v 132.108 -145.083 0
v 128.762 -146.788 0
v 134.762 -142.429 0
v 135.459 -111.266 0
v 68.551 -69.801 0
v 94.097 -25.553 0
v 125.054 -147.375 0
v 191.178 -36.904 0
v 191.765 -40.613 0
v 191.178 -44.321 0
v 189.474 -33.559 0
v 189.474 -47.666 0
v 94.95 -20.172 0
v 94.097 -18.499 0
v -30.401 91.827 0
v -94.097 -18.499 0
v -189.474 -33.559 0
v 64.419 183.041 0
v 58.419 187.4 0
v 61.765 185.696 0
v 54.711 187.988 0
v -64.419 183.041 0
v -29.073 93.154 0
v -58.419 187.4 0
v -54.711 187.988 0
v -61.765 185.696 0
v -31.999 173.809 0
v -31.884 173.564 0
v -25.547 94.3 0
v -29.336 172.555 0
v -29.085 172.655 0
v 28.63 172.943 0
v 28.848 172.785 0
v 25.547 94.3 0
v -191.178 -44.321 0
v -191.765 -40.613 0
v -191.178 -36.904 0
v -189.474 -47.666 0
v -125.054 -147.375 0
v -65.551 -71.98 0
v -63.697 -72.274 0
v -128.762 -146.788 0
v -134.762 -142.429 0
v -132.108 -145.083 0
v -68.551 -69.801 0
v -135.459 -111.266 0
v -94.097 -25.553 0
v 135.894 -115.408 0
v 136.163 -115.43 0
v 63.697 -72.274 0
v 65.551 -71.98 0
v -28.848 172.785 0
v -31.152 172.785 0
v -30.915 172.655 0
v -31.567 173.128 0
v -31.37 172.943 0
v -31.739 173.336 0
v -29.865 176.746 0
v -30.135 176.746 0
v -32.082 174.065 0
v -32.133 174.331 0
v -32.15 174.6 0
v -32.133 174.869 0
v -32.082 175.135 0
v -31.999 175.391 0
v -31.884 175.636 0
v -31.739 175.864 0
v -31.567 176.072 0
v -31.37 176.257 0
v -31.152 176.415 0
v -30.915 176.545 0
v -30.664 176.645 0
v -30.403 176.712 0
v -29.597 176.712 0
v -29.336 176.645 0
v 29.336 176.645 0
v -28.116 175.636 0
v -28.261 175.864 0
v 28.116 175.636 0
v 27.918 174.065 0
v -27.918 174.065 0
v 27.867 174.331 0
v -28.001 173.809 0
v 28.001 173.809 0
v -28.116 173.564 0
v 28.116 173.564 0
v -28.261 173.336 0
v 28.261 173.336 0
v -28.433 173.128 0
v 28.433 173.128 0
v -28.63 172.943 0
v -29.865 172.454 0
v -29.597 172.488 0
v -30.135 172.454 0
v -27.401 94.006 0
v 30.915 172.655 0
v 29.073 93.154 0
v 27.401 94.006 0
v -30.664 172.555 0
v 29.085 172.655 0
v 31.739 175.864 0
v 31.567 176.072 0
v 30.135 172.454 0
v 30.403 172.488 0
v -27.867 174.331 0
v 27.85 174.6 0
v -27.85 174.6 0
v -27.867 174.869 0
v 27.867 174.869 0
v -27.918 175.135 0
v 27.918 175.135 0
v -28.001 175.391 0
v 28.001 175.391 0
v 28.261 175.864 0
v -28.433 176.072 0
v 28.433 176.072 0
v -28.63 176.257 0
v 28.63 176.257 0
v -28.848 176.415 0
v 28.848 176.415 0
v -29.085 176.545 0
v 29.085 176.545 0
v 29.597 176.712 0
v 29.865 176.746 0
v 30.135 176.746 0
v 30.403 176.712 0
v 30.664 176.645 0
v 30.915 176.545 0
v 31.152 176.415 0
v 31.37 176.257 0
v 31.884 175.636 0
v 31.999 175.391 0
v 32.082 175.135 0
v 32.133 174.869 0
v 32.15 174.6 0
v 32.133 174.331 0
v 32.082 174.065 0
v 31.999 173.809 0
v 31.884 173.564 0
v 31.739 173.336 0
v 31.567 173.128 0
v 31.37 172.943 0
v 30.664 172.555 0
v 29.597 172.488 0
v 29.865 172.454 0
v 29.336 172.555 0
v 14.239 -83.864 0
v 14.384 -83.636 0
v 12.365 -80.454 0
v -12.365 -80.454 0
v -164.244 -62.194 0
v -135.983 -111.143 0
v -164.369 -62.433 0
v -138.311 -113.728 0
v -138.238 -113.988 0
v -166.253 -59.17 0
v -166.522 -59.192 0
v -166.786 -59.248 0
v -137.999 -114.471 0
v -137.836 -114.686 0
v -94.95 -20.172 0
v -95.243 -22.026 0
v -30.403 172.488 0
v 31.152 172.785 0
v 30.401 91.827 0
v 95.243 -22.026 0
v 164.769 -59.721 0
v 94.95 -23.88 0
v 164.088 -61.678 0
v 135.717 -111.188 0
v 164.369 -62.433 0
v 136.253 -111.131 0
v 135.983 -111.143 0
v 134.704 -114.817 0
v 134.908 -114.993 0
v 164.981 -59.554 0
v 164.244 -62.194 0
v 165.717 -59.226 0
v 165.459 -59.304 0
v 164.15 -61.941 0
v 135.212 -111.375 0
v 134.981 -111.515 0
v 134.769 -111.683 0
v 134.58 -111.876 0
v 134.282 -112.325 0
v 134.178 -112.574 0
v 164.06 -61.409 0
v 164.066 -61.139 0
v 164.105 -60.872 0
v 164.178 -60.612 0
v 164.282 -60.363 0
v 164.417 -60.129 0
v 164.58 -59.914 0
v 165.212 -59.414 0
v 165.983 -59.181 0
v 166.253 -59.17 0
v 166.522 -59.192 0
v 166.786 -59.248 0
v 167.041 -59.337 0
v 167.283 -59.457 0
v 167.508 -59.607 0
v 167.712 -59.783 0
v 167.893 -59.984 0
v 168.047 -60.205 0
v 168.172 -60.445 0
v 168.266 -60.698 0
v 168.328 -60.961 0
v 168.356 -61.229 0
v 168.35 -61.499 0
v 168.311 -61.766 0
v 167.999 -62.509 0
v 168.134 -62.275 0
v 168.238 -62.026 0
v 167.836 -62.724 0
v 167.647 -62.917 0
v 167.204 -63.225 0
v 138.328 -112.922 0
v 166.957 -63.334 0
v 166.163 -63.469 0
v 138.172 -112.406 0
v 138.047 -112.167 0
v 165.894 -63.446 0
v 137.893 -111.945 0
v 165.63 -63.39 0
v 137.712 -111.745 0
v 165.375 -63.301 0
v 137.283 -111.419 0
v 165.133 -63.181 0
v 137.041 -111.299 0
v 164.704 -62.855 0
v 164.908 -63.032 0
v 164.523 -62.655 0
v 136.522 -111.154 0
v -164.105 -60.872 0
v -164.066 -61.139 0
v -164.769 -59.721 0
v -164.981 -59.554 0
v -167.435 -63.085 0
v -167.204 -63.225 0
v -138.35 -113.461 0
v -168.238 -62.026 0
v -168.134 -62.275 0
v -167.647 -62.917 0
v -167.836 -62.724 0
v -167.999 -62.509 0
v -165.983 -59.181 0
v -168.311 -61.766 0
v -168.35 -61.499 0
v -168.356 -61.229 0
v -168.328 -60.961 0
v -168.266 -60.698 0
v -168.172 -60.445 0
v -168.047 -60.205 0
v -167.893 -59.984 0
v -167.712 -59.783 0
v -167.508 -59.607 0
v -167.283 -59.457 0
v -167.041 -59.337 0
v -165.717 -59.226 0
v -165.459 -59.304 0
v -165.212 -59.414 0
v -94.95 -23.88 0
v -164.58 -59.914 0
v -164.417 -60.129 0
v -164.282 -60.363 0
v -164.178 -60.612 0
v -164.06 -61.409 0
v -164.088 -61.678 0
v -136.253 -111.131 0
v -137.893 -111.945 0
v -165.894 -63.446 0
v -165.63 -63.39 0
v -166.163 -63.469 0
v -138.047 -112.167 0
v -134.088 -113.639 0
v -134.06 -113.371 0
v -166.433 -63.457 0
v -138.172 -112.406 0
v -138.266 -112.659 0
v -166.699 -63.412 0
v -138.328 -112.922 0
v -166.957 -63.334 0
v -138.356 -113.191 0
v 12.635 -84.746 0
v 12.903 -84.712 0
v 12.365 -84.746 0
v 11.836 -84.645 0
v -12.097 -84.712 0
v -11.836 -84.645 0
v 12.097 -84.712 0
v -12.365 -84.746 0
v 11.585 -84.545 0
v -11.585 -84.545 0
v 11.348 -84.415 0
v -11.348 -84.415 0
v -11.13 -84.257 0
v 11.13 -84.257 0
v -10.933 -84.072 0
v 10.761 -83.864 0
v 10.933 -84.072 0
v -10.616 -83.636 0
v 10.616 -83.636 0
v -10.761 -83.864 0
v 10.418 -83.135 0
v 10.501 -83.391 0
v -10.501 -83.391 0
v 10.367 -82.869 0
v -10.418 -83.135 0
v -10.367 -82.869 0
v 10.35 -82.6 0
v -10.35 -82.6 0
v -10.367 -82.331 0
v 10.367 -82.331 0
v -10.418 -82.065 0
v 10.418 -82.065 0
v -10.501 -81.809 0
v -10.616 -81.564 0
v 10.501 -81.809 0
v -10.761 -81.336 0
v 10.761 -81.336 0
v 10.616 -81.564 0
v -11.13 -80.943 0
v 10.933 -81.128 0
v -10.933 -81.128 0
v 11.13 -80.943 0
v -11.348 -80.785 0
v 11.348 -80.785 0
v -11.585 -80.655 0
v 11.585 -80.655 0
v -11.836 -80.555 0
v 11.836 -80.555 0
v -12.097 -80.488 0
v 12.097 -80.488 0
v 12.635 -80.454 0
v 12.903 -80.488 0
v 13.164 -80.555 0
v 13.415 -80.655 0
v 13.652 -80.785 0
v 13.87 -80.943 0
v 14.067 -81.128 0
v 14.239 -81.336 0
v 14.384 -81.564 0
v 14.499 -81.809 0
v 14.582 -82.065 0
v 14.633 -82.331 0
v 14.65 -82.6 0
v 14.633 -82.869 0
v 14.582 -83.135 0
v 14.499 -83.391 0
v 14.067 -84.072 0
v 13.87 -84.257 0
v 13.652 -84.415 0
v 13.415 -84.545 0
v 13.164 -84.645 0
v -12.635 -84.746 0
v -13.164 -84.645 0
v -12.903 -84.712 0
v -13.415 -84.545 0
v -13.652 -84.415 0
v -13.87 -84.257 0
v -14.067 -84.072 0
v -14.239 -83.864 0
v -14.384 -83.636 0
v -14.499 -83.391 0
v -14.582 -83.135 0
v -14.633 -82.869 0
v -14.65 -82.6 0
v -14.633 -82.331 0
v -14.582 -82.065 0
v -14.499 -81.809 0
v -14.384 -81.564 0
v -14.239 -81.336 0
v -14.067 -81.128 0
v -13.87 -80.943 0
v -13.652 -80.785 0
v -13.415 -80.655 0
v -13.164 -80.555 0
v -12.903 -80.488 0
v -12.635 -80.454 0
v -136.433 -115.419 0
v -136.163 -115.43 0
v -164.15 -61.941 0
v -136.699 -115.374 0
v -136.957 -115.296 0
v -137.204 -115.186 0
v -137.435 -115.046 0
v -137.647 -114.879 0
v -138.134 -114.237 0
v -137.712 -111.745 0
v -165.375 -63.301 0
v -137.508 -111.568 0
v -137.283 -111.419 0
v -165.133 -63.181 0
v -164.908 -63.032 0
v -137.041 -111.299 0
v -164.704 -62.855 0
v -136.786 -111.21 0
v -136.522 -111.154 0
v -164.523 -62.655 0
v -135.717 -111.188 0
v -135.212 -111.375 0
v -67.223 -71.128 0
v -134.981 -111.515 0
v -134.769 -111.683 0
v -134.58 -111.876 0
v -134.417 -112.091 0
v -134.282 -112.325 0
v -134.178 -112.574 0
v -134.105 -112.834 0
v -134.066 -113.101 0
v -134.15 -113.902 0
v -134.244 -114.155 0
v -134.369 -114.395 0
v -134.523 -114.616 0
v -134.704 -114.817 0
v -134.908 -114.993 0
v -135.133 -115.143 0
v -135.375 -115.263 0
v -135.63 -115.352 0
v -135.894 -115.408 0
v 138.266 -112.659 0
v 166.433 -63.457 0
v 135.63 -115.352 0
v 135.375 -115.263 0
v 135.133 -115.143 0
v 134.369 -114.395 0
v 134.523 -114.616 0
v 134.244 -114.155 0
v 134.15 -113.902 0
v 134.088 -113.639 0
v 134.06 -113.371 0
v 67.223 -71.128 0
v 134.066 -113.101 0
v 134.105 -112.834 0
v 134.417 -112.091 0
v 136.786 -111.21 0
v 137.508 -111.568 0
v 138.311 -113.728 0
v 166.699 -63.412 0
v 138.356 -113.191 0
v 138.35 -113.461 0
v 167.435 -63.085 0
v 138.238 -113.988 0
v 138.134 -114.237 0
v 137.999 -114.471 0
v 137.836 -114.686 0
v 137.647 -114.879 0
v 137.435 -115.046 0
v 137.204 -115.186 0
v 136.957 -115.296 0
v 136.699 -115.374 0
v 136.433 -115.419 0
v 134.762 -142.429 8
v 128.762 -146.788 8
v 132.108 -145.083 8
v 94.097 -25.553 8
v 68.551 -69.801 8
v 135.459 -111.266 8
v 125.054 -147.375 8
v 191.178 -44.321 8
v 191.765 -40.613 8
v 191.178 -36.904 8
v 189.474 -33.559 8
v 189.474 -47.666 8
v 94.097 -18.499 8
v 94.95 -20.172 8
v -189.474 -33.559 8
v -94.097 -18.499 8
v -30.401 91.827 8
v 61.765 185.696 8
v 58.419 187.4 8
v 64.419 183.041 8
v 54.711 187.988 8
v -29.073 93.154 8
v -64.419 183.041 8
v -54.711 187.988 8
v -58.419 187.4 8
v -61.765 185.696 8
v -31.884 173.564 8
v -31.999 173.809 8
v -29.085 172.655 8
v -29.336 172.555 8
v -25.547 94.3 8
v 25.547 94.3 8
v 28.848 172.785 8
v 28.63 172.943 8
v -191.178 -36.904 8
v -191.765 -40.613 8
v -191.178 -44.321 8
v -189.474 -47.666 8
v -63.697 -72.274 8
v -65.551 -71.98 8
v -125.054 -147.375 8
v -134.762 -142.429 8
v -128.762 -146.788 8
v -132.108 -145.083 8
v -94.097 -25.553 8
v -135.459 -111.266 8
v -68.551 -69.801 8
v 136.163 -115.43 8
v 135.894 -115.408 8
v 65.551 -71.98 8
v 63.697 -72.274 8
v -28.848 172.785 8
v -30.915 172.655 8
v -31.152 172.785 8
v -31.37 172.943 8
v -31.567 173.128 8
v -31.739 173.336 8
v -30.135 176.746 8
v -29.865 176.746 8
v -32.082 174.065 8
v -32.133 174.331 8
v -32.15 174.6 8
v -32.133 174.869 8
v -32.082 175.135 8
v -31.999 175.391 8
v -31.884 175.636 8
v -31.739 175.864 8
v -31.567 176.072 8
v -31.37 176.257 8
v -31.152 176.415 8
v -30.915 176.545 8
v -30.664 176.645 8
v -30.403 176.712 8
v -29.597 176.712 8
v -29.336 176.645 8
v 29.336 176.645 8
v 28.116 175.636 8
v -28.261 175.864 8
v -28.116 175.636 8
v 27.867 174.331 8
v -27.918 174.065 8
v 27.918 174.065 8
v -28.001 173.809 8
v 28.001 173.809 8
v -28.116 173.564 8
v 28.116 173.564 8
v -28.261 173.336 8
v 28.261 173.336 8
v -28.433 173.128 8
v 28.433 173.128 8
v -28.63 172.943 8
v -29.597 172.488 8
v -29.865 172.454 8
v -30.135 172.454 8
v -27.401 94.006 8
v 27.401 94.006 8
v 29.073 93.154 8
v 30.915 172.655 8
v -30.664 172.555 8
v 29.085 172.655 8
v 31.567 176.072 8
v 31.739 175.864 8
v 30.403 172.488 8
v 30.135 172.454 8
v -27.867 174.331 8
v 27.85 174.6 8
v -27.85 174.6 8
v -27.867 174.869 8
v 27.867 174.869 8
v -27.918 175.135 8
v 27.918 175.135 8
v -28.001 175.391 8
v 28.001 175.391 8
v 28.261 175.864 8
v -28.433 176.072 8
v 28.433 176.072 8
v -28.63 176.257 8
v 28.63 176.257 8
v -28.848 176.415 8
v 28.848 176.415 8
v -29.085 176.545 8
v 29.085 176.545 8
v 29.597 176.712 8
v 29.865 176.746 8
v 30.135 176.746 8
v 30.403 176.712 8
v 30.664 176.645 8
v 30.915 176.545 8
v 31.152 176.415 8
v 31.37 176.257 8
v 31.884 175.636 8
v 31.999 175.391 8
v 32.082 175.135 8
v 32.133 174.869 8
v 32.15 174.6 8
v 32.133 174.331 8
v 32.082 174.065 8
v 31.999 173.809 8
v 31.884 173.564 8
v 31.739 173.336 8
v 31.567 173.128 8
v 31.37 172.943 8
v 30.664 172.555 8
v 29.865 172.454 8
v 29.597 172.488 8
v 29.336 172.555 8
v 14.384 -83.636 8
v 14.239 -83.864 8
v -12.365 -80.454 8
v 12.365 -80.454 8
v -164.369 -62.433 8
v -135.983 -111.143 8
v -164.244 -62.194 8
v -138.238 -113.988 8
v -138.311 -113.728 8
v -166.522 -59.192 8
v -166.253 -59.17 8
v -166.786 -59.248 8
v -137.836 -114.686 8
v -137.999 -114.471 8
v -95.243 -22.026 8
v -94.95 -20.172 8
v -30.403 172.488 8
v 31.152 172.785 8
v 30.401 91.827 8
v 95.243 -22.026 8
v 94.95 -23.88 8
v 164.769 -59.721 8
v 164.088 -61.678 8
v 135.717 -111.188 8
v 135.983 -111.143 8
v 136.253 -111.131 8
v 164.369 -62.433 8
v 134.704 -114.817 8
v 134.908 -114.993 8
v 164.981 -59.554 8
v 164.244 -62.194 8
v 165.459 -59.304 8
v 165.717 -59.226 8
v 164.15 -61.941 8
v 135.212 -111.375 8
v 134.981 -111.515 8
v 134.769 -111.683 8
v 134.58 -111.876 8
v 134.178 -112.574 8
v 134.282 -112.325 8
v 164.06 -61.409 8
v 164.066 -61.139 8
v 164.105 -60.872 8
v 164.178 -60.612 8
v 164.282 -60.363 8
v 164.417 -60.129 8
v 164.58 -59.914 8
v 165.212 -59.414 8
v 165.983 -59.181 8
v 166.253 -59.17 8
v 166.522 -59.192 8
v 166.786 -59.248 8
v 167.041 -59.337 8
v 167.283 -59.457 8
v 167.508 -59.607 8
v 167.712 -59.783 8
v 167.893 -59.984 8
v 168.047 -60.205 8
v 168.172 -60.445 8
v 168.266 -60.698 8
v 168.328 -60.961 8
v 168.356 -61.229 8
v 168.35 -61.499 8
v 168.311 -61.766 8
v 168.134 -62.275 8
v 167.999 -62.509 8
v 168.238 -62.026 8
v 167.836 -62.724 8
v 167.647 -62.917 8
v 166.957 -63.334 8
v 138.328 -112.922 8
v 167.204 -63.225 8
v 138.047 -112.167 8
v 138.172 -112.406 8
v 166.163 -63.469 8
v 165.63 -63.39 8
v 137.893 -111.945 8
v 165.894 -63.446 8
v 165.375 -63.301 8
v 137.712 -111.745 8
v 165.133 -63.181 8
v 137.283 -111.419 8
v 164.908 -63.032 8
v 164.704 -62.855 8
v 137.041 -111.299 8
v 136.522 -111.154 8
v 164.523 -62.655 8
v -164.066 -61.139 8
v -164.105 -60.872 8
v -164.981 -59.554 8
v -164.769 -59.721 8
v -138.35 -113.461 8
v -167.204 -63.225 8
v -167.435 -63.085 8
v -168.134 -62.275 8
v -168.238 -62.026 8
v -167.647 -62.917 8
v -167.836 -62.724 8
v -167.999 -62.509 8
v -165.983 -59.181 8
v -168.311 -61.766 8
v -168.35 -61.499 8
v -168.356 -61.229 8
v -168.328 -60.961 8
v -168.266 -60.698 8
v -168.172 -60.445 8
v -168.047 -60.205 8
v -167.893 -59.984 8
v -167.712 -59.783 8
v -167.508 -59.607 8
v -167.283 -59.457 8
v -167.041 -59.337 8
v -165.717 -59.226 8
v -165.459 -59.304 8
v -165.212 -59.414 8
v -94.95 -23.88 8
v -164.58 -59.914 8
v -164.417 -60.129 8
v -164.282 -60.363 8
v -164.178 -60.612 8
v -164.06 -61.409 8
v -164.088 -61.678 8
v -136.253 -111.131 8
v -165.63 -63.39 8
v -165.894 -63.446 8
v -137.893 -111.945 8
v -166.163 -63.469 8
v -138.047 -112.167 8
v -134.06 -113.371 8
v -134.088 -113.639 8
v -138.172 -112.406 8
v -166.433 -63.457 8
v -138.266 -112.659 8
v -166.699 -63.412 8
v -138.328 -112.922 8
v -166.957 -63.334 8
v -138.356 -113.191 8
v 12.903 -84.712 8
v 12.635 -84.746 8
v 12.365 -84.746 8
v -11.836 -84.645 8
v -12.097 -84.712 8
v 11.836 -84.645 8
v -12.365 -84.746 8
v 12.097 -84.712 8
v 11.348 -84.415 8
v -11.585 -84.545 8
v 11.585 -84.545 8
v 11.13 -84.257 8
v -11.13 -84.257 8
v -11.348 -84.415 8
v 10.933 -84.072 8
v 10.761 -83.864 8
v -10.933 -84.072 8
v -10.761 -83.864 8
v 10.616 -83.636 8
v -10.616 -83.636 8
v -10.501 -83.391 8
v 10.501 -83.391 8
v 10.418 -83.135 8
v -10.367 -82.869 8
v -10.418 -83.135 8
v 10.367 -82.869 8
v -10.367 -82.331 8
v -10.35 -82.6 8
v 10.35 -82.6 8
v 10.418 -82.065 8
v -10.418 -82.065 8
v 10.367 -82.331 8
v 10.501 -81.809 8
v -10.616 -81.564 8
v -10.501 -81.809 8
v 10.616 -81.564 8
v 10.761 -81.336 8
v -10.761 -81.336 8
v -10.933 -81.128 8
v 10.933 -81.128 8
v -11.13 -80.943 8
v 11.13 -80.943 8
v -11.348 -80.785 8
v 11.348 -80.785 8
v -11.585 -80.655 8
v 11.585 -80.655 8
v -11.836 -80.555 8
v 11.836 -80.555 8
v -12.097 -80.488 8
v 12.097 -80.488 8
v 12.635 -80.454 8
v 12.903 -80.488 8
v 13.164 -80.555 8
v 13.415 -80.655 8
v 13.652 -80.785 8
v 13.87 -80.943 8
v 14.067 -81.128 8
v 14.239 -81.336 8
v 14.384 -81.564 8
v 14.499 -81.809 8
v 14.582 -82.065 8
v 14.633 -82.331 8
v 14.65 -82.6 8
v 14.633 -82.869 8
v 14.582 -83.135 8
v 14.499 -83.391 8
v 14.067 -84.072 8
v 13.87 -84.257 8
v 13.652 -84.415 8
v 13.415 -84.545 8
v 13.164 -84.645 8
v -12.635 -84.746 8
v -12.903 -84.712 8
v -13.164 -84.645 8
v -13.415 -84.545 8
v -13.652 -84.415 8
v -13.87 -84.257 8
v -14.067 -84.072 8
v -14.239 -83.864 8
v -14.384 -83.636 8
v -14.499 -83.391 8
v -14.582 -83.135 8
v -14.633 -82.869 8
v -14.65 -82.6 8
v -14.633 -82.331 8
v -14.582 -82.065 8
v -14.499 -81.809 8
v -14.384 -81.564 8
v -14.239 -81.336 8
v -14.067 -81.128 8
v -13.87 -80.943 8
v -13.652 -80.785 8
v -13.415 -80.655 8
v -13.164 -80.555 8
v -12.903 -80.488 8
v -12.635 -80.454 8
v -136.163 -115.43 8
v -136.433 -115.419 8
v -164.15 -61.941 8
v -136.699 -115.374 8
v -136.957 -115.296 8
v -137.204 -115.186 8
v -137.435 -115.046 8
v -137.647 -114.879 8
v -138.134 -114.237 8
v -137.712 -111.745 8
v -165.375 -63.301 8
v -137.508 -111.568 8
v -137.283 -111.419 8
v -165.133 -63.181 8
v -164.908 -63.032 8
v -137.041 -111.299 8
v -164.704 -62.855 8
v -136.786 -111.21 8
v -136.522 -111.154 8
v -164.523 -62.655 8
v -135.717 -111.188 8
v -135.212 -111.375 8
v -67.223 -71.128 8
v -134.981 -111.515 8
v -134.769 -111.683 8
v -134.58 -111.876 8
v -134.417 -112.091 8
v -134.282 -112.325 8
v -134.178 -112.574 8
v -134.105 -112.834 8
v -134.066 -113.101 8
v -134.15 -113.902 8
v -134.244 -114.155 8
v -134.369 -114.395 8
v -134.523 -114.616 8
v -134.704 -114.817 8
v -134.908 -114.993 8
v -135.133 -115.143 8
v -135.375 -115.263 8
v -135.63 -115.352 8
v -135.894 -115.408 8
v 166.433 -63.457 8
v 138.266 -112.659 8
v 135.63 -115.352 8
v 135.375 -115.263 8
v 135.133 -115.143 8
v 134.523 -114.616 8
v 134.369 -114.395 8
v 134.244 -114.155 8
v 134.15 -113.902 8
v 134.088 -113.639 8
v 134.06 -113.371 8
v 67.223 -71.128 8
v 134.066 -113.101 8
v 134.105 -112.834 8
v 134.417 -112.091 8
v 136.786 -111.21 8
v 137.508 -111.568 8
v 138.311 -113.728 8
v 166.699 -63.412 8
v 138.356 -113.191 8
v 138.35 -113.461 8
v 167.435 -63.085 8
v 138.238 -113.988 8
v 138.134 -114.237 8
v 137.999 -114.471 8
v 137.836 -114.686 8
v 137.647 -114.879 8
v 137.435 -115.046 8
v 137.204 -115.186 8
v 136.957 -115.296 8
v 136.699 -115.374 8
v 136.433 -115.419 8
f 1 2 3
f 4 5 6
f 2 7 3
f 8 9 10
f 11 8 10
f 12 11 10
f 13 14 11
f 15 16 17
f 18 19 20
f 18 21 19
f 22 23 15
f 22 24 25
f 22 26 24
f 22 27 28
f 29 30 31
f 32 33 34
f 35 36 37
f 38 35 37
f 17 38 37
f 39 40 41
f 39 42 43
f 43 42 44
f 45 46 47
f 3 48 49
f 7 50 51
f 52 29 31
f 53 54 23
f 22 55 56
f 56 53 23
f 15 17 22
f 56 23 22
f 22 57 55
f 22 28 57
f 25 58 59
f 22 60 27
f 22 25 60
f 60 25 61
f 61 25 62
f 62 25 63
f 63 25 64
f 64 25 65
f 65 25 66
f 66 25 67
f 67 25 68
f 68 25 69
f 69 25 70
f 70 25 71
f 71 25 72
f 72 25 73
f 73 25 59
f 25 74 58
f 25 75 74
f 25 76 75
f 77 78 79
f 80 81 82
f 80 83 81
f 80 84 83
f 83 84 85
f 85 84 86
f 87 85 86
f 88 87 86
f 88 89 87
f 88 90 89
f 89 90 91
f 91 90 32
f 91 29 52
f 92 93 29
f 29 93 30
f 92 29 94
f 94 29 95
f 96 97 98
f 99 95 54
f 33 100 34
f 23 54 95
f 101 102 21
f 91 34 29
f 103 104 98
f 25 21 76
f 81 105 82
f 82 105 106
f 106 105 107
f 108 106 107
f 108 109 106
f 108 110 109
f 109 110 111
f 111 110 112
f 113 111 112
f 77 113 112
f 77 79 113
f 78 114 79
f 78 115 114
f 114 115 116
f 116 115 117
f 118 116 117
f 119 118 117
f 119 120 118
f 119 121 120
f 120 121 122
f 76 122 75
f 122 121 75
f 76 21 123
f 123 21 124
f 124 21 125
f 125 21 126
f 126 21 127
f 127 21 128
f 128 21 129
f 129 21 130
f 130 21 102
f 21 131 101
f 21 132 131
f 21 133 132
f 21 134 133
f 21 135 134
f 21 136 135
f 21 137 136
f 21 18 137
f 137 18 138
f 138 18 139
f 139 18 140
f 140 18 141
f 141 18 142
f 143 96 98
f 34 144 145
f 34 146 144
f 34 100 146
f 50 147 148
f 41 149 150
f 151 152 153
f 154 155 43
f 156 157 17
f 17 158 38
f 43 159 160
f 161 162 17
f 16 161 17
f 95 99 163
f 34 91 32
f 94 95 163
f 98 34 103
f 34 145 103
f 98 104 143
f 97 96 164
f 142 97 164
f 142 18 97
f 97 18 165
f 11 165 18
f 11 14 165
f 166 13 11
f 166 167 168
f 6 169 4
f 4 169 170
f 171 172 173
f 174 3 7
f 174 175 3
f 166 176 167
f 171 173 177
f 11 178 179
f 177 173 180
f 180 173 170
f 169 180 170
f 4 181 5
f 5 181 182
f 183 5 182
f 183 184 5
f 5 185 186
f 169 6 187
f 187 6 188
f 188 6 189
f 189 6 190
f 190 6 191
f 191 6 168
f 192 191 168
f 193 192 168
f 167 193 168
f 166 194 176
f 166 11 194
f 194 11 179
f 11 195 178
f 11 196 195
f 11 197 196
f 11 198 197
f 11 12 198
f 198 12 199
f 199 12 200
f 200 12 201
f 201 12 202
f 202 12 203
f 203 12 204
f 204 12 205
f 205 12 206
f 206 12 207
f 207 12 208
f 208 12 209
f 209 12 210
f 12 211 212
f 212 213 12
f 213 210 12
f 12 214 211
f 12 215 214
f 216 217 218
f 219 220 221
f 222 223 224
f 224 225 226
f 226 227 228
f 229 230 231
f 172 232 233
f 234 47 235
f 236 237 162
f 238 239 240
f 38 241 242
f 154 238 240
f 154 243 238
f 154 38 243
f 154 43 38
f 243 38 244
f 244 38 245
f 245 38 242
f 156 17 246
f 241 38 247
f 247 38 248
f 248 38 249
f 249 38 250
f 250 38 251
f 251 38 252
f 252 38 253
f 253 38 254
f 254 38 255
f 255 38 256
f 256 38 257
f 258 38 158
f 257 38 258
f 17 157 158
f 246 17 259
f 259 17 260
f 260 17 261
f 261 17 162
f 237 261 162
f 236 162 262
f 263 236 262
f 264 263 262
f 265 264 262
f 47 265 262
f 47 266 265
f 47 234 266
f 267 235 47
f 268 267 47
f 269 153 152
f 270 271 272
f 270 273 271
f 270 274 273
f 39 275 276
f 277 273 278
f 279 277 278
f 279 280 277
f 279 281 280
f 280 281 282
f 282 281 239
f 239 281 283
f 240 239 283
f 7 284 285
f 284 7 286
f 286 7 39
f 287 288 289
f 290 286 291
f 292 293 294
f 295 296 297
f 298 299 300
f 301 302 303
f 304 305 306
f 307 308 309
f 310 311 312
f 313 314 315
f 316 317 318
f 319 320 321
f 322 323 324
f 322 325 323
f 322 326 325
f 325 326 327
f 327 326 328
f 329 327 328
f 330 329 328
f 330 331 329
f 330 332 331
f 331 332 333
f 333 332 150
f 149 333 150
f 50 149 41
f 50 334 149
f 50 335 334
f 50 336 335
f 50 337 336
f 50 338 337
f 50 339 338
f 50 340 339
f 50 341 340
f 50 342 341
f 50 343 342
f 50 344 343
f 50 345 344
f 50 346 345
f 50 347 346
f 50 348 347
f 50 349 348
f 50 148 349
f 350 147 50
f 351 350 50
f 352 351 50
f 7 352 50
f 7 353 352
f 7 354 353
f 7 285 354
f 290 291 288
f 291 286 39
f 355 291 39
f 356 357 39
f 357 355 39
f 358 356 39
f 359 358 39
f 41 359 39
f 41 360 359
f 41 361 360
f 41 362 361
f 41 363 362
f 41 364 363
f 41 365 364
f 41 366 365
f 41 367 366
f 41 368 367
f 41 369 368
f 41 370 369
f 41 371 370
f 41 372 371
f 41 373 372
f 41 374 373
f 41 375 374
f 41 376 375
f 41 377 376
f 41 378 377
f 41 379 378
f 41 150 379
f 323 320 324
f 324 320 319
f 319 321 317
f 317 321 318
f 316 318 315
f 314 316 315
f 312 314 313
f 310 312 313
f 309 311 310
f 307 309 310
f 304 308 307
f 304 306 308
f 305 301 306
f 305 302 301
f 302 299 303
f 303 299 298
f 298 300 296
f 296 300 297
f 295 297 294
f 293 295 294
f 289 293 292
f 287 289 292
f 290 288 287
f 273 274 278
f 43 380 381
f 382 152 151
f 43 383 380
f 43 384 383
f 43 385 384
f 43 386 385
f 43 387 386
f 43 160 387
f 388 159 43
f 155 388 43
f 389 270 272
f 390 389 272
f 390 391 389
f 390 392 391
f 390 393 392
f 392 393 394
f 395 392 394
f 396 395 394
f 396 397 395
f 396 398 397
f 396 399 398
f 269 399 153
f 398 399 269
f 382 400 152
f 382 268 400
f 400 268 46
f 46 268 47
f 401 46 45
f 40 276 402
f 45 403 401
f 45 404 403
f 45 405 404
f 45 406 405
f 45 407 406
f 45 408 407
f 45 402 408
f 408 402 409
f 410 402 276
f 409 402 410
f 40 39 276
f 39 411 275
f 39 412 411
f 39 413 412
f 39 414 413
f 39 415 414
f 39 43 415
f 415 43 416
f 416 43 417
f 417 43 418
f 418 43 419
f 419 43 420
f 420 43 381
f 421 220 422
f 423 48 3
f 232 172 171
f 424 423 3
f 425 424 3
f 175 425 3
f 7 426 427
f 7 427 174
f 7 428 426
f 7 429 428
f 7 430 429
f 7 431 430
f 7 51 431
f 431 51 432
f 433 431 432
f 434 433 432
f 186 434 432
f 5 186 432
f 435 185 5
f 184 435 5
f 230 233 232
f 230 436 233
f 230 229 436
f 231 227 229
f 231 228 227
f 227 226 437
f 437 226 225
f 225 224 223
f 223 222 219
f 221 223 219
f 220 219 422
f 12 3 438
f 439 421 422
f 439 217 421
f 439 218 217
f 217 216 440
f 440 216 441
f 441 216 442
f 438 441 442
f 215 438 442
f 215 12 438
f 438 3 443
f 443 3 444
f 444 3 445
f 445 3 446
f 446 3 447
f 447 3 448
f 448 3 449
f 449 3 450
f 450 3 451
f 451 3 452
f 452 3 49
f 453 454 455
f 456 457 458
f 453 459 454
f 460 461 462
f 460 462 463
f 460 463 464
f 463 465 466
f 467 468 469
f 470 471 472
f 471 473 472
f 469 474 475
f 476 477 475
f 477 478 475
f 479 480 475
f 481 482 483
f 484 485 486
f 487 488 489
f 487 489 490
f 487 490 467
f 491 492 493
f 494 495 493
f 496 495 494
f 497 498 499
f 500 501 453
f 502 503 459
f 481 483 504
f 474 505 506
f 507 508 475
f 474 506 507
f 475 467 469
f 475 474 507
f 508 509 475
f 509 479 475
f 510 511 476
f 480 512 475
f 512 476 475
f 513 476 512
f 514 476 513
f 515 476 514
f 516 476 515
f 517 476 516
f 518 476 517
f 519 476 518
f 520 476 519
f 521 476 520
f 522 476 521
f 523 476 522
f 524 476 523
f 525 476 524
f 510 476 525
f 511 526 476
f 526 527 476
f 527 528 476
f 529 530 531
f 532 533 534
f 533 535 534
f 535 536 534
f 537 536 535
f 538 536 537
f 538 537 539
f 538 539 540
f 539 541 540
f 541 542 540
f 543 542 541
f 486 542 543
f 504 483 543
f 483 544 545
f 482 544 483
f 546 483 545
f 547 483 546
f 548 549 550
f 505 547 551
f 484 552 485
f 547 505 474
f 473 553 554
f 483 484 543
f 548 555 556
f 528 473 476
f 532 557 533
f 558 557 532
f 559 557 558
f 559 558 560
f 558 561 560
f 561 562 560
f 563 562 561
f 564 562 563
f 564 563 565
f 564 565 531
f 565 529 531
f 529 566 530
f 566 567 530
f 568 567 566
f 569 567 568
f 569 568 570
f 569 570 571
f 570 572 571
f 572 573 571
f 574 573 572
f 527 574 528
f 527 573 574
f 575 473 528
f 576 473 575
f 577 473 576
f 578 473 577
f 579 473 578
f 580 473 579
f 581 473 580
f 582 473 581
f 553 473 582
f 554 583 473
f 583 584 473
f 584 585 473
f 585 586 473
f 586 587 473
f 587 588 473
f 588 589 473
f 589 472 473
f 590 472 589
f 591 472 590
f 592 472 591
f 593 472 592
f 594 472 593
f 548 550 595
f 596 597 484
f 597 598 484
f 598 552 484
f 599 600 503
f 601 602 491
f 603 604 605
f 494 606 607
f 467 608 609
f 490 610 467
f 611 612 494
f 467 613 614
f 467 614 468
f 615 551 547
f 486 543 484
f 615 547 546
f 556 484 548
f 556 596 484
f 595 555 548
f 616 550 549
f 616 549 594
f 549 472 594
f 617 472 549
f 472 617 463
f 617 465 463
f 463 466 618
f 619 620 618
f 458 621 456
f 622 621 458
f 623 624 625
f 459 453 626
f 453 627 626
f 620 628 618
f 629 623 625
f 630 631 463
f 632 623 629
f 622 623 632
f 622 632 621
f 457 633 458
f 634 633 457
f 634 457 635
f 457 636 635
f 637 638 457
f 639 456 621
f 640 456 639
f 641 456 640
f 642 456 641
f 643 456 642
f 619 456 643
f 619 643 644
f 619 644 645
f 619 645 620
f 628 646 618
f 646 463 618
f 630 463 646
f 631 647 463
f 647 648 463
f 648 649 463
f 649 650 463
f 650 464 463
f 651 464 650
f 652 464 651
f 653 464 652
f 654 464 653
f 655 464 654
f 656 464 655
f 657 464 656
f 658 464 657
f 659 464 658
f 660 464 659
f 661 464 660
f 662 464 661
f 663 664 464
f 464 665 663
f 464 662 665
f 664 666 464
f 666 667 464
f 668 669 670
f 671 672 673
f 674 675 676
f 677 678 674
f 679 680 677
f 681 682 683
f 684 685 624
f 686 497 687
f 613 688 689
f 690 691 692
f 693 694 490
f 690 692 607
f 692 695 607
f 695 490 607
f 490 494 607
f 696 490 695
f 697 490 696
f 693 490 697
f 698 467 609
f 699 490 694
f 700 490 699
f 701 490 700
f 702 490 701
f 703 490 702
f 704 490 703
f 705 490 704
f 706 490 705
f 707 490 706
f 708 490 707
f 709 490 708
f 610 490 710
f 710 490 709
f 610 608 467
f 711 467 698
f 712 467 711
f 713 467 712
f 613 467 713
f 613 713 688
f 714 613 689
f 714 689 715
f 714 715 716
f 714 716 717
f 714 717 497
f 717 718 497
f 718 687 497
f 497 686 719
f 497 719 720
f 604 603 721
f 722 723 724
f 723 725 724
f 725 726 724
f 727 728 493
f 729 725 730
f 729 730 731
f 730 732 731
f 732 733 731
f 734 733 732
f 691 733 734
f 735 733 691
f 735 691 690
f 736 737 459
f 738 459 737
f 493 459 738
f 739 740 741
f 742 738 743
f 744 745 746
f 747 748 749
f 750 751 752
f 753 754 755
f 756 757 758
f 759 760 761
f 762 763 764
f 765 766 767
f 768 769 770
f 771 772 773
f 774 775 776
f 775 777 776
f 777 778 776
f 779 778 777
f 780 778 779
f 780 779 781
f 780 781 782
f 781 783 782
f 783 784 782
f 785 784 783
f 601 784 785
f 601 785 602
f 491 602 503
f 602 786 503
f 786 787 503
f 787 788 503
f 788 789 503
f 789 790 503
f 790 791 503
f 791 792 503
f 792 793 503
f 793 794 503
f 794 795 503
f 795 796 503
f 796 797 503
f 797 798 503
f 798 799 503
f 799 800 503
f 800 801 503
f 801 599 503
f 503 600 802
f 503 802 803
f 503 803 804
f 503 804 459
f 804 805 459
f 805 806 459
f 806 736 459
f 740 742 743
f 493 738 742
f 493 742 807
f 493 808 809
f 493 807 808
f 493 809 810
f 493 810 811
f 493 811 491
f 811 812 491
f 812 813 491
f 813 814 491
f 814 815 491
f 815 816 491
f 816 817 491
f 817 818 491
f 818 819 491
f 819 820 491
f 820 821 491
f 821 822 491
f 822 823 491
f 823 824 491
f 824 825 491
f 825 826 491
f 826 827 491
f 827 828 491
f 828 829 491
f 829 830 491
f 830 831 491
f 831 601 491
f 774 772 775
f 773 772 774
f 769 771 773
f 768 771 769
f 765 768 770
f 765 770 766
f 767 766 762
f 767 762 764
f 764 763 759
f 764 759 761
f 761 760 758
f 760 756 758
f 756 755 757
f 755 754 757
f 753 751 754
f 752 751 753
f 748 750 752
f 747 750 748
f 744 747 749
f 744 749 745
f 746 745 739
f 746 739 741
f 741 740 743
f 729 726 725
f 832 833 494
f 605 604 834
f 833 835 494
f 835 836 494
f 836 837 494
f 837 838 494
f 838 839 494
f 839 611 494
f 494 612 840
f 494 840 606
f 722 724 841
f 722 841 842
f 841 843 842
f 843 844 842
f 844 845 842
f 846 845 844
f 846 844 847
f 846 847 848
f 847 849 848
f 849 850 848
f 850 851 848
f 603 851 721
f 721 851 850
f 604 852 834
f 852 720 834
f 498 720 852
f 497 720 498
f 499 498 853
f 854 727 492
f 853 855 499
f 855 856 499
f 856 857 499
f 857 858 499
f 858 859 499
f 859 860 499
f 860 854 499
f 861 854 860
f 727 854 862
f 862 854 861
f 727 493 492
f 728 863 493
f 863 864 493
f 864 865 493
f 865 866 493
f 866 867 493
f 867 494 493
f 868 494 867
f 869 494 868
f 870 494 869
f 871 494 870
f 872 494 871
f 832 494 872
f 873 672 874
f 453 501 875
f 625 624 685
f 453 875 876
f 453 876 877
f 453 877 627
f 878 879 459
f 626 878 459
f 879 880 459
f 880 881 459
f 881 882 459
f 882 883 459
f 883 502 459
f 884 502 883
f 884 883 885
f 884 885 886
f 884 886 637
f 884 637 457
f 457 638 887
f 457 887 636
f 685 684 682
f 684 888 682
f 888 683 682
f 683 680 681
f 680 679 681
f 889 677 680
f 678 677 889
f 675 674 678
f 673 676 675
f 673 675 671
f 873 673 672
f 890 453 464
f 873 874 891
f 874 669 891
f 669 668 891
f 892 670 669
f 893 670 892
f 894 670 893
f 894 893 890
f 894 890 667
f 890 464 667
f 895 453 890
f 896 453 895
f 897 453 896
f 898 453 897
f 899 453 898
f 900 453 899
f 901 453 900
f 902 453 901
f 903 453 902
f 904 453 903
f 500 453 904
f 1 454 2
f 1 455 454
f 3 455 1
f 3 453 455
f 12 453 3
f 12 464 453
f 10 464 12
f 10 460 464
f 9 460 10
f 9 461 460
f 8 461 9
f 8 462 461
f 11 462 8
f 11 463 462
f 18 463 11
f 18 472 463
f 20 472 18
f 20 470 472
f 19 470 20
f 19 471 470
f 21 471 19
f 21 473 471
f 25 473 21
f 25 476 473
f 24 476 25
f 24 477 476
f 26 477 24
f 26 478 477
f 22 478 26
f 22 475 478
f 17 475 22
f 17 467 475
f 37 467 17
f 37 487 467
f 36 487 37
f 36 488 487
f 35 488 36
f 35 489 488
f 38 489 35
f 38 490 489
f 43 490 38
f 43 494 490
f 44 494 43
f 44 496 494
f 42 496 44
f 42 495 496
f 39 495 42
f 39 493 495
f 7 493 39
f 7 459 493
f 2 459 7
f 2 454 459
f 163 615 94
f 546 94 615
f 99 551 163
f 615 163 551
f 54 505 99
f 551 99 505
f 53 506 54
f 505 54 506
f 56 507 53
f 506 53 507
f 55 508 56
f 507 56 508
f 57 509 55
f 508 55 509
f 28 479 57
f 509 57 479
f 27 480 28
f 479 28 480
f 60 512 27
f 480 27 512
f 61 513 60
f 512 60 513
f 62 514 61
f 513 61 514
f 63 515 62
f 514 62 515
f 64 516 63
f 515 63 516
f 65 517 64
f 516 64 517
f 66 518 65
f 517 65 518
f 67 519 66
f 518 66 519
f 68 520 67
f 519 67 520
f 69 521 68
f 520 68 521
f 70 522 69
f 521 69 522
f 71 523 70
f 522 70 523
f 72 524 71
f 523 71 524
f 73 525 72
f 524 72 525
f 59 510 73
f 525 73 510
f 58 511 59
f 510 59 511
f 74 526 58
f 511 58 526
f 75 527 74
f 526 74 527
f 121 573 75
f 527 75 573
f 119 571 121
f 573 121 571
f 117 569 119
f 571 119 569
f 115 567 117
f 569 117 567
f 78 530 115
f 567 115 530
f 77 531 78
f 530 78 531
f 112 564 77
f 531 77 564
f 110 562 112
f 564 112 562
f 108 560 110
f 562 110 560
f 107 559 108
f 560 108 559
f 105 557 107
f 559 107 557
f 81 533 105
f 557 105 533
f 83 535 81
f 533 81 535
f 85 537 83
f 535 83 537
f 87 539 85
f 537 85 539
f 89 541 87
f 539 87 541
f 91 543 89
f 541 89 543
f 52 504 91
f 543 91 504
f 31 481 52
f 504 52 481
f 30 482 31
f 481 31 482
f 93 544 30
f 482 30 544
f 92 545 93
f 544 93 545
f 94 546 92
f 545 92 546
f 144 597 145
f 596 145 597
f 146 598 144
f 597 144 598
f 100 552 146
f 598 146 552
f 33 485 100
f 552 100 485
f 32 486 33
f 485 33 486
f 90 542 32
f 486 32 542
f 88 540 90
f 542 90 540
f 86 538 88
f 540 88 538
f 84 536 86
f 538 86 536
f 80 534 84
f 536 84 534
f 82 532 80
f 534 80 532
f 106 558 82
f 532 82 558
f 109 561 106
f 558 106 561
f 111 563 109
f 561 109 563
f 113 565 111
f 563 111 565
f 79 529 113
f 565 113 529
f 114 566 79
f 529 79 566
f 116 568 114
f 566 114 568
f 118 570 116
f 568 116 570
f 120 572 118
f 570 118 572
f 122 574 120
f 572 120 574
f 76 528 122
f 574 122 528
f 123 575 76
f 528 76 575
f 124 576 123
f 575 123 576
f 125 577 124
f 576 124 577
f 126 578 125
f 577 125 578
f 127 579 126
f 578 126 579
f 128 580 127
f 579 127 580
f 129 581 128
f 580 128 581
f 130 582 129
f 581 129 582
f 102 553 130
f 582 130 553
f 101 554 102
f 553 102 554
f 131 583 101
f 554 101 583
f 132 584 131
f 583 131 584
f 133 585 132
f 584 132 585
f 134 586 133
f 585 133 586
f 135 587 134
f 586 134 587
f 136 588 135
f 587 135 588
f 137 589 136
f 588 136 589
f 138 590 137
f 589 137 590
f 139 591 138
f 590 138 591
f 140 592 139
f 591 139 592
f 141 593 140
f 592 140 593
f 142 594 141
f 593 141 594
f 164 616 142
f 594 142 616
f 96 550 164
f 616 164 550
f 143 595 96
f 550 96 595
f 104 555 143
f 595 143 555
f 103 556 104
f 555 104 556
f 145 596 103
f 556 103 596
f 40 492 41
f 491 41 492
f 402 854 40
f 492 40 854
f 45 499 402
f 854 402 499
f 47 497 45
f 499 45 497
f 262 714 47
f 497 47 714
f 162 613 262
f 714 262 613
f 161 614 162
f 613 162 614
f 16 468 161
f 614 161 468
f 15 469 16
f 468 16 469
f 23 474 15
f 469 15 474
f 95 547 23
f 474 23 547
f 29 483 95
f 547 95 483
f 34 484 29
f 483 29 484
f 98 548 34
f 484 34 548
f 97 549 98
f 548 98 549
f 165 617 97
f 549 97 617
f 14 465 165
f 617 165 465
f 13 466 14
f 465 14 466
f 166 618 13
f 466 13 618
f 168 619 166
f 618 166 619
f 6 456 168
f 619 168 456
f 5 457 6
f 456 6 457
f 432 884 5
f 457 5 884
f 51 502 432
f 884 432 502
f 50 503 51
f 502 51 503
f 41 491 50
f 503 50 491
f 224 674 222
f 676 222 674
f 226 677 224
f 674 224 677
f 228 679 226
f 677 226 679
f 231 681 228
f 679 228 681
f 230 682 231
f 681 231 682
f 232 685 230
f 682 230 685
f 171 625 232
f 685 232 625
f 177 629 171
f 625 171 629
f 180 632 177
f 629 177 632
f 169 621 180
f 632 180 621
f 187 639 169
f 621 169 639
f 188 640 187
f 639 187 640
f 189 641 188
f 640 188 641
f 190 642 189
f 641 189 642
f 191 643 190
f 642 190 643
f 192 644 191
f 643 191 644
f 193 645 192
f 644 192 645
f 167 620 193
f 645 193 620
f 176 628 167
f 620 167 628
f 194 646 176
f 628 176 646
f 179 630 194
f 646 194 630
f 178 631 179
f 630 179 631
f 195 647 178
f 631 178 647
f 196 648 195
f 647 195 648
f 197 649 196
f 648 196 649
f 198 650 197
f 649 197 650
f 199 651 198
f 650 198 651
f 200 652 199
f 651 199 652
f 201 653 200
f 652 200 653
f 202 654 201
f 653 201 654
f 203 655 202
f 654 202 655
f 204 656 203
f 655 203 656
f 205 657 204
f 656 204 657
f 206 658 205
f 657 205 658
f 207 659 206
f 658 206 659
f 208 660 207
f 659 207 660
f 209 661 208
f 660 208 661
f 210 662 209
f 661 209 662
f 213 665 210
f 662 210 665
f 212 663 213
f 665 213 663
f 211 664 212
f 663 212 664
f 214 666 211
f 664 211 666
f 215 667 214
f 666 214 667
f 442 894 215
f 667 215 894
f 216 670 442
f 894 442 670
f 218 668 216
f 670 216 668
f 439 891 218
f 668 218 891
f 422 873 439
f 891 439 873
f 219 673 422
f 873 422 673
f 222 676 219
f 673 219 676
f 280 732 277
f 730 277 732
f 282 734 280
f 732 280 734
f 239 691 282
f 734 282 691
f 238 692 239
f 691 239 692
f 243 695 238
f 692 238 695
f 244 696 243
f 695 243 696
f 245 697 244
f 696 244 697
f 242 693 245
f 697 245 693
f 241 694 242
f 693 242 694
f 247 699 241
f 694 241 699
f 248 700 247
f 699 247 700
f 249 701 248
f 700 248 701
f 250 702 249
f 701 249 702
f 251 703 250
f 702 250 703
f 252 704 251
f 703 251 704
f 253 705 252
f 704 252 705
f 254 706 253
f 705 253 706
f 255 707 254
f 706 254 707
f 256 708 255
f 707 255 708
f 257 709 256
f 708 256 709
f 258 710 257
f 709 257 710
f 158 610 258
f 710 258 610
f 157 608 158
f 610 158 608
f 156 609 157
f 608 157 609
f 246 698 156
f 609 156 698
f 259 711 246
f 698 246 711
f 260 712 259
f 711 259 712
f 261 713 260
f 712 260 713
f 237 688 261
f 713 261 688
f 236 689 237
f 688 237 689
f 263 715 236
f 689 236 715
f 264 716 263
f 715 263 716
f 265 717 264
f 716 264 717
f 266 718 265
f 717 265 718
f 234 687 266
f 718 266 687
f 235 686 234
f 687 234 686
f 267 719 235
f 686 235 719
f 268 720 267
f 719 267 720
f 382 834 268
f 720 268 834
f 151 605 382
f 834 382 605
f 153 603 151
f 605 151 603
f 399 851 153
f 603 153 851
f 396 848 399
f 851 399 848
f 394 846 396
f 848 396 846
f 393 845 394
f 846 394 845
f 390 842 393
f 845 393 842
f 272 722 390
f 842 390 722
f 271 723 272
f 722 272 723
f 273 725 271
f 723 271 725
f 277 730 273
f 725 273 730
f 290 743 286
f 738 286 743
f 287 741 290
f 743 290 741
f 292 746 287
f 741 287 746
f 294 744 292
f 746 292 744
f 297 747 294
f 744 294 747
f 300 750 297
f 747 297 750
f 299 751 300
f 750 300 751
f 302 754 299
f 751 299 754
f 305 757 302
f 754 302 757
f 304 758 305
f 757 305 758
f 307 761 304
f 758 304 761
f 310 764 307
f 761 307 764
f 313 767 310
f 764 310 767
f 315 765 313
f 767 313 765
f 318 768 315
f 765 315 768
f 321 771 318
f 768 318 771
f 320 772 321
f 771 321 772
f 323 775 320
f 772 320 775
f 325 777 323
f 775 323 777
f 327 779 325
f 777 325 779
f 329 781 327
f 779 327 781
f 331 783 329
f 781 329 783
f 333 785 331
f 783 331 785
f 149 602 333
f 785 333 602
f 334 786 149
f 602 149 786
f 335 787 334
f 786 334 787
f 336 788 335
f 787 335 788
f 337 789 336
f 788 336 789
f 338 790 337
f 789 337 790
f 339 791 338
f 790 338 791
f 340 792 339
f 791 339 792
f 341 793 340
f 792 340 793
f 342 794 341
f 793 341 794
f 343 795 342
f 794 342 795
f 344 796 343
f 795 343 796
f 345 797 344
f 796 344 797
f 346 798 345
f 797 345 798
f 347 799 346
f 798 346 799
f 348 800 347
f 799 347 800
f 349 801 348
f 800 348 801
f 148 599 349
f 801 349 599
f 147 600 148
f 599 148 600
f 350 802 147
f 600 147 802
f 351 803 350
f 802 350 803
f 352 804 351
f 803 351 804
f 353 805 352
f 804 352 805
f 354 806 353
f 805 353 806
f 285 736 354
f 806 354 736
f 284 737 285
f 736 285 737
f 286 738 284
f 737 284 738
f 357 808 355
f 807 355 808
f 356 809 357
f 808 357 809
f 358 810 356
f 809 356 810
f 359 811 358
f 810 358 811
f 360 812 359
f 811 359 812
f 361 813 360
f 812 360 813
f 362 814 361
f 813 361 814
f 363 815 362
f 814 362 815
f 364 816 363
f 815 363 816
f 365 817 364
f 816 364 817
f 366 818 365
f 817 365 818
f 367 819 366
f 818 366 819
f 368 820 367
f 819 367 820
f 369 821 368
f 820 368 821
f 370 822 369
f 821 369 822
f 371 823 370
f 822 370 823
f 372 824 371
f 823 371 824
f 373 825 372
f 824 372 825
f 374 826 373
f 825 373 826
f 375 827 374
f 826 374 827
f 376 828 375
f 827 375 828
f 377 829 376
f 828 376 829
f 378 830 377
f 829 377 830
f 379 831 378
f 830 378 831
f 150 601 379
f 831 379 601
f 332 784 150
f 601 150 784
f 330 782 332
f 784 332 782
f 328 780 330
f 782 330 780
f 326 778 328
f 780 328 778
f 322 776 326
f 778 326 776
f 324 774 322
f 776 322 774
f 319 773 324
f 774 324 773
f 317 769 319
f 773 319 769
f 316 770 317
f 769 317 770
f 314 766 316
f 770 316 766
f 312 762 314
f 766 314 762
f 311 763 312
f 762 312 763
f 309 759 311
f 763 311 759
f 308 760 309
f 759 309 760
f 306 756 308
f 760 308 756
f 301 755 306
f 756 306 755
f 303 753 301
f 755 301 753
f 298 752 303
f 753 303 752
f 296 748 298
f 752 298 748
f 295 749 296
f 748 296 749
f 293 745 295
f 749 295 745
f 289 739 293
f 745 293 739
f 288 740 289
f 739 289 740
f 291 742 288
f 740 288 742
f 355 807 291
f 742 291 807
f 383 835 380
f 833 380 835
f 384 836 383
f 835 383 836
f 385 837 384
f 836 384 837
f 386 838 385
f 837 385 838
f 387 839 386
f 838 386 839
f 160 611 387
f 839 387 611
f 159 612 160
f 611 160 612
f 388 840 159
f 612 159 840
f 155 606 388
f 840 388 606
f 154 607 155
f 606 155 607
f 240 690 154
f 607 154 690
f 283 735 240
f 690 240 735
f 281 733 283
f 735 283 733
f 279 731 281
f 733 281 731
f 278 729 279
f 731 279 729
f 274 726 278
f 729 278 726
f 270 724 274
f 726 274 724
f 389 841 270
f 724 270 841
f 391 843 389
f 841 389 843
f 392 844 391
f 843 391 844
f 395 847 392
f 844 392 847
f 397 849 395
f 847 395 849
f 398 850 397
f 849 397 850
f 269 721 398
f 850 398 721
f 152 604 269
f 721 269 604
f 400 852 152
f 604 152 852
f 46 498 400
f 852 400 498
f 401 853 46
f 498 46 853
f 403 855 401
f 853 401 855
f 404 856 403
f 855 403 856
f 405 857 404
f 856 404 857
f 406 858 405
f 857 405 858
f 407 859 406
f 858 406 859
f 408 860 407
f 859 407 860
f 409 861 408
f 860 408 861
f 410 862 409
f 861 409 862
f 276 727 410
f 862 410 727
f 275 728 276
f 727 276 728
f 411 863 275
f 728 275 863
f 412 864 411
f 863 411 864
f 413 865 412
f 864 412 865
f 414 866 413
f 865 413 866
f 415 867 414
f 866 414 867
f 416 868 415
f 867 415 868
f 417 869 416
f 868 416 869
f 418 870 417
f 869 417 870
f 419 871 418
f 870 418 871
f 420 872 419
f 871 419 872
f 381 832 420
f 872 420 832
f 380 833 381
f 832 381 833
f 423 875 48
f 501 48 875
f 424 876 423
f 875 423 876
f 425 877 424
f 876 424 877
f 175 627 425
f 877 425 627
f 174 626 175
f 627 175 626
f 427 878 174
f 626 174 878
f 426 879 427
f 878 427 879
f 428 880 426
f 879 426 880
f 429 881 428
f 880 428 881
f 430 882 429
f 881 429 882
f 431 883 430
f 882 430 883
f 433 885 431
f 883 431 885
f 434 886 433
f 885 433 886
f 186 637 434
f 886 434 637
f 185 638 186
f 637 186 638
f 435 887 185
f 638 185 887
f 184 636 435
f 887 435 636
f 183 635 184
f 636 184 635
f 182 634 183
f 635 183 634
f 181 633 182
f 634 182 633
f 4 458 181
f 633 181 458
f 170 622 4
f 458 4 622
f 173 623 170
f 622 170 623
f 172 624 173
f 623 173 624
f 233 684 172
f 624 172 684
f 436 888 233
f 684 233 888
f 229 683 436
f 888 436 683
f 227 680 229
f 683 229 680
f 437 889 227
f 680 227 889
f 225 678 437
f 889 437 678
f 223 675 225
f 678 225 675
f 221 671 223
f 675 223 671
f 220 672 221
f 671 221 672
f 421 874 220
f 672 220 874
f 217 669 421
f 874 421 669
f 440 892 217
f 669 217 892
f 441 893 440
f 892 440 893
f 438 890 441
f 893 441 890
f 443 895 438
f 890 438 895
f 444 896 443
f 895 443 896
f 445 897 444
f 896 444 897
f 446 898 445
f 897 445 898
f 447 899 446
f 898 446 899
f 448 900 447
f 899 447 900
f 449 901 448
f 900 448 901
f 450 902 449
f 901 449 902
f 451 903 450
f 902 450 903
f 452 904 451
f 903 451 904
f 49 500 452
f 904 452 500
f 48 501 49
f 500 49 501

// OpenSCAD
// file: konfiguracja.scad
/*
    PARAMETRY UKŁADU
*/
    // WIELKOŚCI GŁÓWNE
 
     //MKY3
     //dg
    srednica_grzalki=[214,214];
        
    //dw
    //Średnica wałka prowadzącego
    srednica_walka=8;
    
    //H
    // Wysokość konstrukcji (zależna od prowadnic fi8) [H]
    // Wysokosc manipulatora (750mm) wynika z założonego materiału (długość pręta fi8 150cm)
    wysokosc_konstrukcji=750;


    // WIELKOŚCI INNE
    
    
    // Wysokość dolnej podstawy od ziemii   [h]
    //(motor_end_height)
    wysokosc_podstawy=62.3;
    
    
    // Grubość podstawy górnej i dolnej
    grubosc_podstawy=8;
    
    // Wysokość stołu grzejnego wraz z grubością
    wysokosc_grzalki=2;
    
    
    
    //Zaokrąglenie podstawy
    corner_radius=12;
    
    //Grubość platformy roboczej
    grubosc_platformy=8;
    

    // WARTOŚCI OBLICZONE
    
    //rk
    promien_konstrukcji = srednica_grzalki[0]*0.9;
    //192,6mm
    // wyznaczenie położenia prętów i innych elekentów konstrukcji od środka układu współrzędnych
    
    dlugosc_ramion=srednica_grzalki[0]*1.2;
    //259,2

    //Promień podstawy
    //frame_radius
    promien_podstawy=(promien_konstrukcji-srednica_walka/2-1.9*corner_radius)/cos(30);
    platform_hinge_offset=33;
    carriage_hinge_offset=22;             // default rostock mini platform
    wysokosc_wozka=32;
    idler_end_height=32; 
    
    //echo
    echo("Promień konstrukcji",promien_konstrukcji);
    echo("Długość ramion",dlugosc_ramion);
    echo("Promień podstawy",promien_podstawy);
    
    dlugosc_tasmy=ceil((25*3.14/2)+((22+0)*3.14/2)+2*(wysokosc_konstrukcji-42.3/2-5-14.95));
    echo("Długość taśmy",dlugosc_tasmy,"mm");
    ilosc_modulow=dlugosc_tasmy/2;
    echo("Ilość modułów",ilosc_modulow);
// main file
/*
    PODSTAWA DOLNA I GÓRNA
*/

include <konfiguracja.scad>

$fn = 20;
tr=1.3;     //mnożnik podstawy
echo(promien_podstawy*tr);

            czarny = [0, 0, 0, 0.75];
            aluminum = [0.92, 0.92, 0.92, 1];
            purple =[0.5,0,0.5,0.4];
            
module podstawa_dolna()
{
    color(purple)
    difference(){
    minkowski() 
    {
        intersection() 
        {
        rotate(90)
        circle(r=promien_podstawy*sqrt(2),$fn=3,center=true);
        rotate(270)
        circle(r=promien_podstawy*tr*sqrt(2),$fn=3,center=true);
        }
    circle(r=corner_radius);
    }
    //mocowanie na wsporniki dolne
    for(x=[-30,30])
    {
    for(i=[1:3])
    rotate(120*i,0,0)
    {
    translate([x,promien_konstrukcji-18,0]) circle(r=2.15,$fn=50,center=true);
    translate([x,promien_konstrukcji-48,0]) circle(r=2.15,$fn=50,center=true);
    }
    //heatbed mky3 (fi210)
    for(i=[1:6])
    rotate(60*i,0,0)
    {
    rotate(a = [0, 0, 0]) translate([0,104.5,2]) circle(r=1.65,$fn=50,center=true);
    }
    }
    //fanmount 30x30
    translate([15,promien_konstrukcji-100,0]) circle(r=1.65,$fn=50,center=true);
    translate([-15,promien_konstrukcji-100,0]) circle(r=1.65,$fn=50,center=true);
    translate([15+25,promien_konstrukcji-100,0]) circle(r=1.65,$fn=50,center=true);
    translate([-15-25,promien_konstrukcji-100,0]) circle(r=1.65,$fn=50,center=true);
    //GT2560
    translate([92.9/2,promien_konstrukcji-130,0]) circle(r=1.65,$fn=50,center=true);
    translate([-92.9/2,promien_konstrukcji-130,0]) circle(r=1.65,$fn=50,center=true);
    translate([92.9/2,promien_konstrukcji-130-71.7,0]) circle(r=1.65,$fn=50,center=true);
    translate([-92.9/2,promien_konstrukcji-130-71.7,0]) circle(r=1.65,$fn=50,center=true);
    }
}
module podstawa_dolna2()
{
    linear_extrude(height=grubosc_podstawy)  podstawa_dolna();
}
    //podstawa_dolna();
    //podstawa_dolna2();

module podstawa_gorna()
{
        color(purple)
        difference(){
        difference(){
        difference()
        {
                minkowski() 
                {
                intersection() 
                {
                    rotate(90)
                    circle(r=promien_podstawy*sqrt(2),$fn=3,center=true);
                    rotate(270)
                    circle(r=promien_podstawy*tr*sqrt(2),$fn=3,center=true);
                }
                circle(r=corner_radius);
                }
            scale(0.5) minkowski() 
            {
            intersection() 
            {
			circle(r=(promien_konstrukcji-srednica_walka/2-corner_radius)/cos(30),$fn=6,center=true);
			rotate(90) circle(r=(promien_konstrukcji-srednica_walka/2-corner_radius)/cos(30)*1.3,$fn=3,center=true);
            }
		circle(r=corner_radius);
            }
      }
      //mocowanie na wsporniki górne
    for(x=[-30,30])
    {
    for(i=[1:3])
    rotate(120*i,0,0)
    {
    translate([x,promien_konstrukcji-18,0]) circle(r=2.15,$fn=50,center=true);
    }
    }
    }
    translate([12.5,-promien_konstrukcji+110,0]) circle(r=2.15,$fn=50,center=true);
    translate([-12.5,-promien_konstrukcji+110,0]) circle(r=2.15,$fn=50,center=true);
    }
}

module podstawa_gorna2()
{
    linear_extrude(height=grubosc_podstawy)   podstawa_gorna();
}
    //podstawa_gorna();
    podstawa_gorna2();

//projection(cut=false) import("ramka.stl");
//projection(cut=false) podstawa_gorna(promien_podstawy,promien_konstrukcji,corner_radius)
